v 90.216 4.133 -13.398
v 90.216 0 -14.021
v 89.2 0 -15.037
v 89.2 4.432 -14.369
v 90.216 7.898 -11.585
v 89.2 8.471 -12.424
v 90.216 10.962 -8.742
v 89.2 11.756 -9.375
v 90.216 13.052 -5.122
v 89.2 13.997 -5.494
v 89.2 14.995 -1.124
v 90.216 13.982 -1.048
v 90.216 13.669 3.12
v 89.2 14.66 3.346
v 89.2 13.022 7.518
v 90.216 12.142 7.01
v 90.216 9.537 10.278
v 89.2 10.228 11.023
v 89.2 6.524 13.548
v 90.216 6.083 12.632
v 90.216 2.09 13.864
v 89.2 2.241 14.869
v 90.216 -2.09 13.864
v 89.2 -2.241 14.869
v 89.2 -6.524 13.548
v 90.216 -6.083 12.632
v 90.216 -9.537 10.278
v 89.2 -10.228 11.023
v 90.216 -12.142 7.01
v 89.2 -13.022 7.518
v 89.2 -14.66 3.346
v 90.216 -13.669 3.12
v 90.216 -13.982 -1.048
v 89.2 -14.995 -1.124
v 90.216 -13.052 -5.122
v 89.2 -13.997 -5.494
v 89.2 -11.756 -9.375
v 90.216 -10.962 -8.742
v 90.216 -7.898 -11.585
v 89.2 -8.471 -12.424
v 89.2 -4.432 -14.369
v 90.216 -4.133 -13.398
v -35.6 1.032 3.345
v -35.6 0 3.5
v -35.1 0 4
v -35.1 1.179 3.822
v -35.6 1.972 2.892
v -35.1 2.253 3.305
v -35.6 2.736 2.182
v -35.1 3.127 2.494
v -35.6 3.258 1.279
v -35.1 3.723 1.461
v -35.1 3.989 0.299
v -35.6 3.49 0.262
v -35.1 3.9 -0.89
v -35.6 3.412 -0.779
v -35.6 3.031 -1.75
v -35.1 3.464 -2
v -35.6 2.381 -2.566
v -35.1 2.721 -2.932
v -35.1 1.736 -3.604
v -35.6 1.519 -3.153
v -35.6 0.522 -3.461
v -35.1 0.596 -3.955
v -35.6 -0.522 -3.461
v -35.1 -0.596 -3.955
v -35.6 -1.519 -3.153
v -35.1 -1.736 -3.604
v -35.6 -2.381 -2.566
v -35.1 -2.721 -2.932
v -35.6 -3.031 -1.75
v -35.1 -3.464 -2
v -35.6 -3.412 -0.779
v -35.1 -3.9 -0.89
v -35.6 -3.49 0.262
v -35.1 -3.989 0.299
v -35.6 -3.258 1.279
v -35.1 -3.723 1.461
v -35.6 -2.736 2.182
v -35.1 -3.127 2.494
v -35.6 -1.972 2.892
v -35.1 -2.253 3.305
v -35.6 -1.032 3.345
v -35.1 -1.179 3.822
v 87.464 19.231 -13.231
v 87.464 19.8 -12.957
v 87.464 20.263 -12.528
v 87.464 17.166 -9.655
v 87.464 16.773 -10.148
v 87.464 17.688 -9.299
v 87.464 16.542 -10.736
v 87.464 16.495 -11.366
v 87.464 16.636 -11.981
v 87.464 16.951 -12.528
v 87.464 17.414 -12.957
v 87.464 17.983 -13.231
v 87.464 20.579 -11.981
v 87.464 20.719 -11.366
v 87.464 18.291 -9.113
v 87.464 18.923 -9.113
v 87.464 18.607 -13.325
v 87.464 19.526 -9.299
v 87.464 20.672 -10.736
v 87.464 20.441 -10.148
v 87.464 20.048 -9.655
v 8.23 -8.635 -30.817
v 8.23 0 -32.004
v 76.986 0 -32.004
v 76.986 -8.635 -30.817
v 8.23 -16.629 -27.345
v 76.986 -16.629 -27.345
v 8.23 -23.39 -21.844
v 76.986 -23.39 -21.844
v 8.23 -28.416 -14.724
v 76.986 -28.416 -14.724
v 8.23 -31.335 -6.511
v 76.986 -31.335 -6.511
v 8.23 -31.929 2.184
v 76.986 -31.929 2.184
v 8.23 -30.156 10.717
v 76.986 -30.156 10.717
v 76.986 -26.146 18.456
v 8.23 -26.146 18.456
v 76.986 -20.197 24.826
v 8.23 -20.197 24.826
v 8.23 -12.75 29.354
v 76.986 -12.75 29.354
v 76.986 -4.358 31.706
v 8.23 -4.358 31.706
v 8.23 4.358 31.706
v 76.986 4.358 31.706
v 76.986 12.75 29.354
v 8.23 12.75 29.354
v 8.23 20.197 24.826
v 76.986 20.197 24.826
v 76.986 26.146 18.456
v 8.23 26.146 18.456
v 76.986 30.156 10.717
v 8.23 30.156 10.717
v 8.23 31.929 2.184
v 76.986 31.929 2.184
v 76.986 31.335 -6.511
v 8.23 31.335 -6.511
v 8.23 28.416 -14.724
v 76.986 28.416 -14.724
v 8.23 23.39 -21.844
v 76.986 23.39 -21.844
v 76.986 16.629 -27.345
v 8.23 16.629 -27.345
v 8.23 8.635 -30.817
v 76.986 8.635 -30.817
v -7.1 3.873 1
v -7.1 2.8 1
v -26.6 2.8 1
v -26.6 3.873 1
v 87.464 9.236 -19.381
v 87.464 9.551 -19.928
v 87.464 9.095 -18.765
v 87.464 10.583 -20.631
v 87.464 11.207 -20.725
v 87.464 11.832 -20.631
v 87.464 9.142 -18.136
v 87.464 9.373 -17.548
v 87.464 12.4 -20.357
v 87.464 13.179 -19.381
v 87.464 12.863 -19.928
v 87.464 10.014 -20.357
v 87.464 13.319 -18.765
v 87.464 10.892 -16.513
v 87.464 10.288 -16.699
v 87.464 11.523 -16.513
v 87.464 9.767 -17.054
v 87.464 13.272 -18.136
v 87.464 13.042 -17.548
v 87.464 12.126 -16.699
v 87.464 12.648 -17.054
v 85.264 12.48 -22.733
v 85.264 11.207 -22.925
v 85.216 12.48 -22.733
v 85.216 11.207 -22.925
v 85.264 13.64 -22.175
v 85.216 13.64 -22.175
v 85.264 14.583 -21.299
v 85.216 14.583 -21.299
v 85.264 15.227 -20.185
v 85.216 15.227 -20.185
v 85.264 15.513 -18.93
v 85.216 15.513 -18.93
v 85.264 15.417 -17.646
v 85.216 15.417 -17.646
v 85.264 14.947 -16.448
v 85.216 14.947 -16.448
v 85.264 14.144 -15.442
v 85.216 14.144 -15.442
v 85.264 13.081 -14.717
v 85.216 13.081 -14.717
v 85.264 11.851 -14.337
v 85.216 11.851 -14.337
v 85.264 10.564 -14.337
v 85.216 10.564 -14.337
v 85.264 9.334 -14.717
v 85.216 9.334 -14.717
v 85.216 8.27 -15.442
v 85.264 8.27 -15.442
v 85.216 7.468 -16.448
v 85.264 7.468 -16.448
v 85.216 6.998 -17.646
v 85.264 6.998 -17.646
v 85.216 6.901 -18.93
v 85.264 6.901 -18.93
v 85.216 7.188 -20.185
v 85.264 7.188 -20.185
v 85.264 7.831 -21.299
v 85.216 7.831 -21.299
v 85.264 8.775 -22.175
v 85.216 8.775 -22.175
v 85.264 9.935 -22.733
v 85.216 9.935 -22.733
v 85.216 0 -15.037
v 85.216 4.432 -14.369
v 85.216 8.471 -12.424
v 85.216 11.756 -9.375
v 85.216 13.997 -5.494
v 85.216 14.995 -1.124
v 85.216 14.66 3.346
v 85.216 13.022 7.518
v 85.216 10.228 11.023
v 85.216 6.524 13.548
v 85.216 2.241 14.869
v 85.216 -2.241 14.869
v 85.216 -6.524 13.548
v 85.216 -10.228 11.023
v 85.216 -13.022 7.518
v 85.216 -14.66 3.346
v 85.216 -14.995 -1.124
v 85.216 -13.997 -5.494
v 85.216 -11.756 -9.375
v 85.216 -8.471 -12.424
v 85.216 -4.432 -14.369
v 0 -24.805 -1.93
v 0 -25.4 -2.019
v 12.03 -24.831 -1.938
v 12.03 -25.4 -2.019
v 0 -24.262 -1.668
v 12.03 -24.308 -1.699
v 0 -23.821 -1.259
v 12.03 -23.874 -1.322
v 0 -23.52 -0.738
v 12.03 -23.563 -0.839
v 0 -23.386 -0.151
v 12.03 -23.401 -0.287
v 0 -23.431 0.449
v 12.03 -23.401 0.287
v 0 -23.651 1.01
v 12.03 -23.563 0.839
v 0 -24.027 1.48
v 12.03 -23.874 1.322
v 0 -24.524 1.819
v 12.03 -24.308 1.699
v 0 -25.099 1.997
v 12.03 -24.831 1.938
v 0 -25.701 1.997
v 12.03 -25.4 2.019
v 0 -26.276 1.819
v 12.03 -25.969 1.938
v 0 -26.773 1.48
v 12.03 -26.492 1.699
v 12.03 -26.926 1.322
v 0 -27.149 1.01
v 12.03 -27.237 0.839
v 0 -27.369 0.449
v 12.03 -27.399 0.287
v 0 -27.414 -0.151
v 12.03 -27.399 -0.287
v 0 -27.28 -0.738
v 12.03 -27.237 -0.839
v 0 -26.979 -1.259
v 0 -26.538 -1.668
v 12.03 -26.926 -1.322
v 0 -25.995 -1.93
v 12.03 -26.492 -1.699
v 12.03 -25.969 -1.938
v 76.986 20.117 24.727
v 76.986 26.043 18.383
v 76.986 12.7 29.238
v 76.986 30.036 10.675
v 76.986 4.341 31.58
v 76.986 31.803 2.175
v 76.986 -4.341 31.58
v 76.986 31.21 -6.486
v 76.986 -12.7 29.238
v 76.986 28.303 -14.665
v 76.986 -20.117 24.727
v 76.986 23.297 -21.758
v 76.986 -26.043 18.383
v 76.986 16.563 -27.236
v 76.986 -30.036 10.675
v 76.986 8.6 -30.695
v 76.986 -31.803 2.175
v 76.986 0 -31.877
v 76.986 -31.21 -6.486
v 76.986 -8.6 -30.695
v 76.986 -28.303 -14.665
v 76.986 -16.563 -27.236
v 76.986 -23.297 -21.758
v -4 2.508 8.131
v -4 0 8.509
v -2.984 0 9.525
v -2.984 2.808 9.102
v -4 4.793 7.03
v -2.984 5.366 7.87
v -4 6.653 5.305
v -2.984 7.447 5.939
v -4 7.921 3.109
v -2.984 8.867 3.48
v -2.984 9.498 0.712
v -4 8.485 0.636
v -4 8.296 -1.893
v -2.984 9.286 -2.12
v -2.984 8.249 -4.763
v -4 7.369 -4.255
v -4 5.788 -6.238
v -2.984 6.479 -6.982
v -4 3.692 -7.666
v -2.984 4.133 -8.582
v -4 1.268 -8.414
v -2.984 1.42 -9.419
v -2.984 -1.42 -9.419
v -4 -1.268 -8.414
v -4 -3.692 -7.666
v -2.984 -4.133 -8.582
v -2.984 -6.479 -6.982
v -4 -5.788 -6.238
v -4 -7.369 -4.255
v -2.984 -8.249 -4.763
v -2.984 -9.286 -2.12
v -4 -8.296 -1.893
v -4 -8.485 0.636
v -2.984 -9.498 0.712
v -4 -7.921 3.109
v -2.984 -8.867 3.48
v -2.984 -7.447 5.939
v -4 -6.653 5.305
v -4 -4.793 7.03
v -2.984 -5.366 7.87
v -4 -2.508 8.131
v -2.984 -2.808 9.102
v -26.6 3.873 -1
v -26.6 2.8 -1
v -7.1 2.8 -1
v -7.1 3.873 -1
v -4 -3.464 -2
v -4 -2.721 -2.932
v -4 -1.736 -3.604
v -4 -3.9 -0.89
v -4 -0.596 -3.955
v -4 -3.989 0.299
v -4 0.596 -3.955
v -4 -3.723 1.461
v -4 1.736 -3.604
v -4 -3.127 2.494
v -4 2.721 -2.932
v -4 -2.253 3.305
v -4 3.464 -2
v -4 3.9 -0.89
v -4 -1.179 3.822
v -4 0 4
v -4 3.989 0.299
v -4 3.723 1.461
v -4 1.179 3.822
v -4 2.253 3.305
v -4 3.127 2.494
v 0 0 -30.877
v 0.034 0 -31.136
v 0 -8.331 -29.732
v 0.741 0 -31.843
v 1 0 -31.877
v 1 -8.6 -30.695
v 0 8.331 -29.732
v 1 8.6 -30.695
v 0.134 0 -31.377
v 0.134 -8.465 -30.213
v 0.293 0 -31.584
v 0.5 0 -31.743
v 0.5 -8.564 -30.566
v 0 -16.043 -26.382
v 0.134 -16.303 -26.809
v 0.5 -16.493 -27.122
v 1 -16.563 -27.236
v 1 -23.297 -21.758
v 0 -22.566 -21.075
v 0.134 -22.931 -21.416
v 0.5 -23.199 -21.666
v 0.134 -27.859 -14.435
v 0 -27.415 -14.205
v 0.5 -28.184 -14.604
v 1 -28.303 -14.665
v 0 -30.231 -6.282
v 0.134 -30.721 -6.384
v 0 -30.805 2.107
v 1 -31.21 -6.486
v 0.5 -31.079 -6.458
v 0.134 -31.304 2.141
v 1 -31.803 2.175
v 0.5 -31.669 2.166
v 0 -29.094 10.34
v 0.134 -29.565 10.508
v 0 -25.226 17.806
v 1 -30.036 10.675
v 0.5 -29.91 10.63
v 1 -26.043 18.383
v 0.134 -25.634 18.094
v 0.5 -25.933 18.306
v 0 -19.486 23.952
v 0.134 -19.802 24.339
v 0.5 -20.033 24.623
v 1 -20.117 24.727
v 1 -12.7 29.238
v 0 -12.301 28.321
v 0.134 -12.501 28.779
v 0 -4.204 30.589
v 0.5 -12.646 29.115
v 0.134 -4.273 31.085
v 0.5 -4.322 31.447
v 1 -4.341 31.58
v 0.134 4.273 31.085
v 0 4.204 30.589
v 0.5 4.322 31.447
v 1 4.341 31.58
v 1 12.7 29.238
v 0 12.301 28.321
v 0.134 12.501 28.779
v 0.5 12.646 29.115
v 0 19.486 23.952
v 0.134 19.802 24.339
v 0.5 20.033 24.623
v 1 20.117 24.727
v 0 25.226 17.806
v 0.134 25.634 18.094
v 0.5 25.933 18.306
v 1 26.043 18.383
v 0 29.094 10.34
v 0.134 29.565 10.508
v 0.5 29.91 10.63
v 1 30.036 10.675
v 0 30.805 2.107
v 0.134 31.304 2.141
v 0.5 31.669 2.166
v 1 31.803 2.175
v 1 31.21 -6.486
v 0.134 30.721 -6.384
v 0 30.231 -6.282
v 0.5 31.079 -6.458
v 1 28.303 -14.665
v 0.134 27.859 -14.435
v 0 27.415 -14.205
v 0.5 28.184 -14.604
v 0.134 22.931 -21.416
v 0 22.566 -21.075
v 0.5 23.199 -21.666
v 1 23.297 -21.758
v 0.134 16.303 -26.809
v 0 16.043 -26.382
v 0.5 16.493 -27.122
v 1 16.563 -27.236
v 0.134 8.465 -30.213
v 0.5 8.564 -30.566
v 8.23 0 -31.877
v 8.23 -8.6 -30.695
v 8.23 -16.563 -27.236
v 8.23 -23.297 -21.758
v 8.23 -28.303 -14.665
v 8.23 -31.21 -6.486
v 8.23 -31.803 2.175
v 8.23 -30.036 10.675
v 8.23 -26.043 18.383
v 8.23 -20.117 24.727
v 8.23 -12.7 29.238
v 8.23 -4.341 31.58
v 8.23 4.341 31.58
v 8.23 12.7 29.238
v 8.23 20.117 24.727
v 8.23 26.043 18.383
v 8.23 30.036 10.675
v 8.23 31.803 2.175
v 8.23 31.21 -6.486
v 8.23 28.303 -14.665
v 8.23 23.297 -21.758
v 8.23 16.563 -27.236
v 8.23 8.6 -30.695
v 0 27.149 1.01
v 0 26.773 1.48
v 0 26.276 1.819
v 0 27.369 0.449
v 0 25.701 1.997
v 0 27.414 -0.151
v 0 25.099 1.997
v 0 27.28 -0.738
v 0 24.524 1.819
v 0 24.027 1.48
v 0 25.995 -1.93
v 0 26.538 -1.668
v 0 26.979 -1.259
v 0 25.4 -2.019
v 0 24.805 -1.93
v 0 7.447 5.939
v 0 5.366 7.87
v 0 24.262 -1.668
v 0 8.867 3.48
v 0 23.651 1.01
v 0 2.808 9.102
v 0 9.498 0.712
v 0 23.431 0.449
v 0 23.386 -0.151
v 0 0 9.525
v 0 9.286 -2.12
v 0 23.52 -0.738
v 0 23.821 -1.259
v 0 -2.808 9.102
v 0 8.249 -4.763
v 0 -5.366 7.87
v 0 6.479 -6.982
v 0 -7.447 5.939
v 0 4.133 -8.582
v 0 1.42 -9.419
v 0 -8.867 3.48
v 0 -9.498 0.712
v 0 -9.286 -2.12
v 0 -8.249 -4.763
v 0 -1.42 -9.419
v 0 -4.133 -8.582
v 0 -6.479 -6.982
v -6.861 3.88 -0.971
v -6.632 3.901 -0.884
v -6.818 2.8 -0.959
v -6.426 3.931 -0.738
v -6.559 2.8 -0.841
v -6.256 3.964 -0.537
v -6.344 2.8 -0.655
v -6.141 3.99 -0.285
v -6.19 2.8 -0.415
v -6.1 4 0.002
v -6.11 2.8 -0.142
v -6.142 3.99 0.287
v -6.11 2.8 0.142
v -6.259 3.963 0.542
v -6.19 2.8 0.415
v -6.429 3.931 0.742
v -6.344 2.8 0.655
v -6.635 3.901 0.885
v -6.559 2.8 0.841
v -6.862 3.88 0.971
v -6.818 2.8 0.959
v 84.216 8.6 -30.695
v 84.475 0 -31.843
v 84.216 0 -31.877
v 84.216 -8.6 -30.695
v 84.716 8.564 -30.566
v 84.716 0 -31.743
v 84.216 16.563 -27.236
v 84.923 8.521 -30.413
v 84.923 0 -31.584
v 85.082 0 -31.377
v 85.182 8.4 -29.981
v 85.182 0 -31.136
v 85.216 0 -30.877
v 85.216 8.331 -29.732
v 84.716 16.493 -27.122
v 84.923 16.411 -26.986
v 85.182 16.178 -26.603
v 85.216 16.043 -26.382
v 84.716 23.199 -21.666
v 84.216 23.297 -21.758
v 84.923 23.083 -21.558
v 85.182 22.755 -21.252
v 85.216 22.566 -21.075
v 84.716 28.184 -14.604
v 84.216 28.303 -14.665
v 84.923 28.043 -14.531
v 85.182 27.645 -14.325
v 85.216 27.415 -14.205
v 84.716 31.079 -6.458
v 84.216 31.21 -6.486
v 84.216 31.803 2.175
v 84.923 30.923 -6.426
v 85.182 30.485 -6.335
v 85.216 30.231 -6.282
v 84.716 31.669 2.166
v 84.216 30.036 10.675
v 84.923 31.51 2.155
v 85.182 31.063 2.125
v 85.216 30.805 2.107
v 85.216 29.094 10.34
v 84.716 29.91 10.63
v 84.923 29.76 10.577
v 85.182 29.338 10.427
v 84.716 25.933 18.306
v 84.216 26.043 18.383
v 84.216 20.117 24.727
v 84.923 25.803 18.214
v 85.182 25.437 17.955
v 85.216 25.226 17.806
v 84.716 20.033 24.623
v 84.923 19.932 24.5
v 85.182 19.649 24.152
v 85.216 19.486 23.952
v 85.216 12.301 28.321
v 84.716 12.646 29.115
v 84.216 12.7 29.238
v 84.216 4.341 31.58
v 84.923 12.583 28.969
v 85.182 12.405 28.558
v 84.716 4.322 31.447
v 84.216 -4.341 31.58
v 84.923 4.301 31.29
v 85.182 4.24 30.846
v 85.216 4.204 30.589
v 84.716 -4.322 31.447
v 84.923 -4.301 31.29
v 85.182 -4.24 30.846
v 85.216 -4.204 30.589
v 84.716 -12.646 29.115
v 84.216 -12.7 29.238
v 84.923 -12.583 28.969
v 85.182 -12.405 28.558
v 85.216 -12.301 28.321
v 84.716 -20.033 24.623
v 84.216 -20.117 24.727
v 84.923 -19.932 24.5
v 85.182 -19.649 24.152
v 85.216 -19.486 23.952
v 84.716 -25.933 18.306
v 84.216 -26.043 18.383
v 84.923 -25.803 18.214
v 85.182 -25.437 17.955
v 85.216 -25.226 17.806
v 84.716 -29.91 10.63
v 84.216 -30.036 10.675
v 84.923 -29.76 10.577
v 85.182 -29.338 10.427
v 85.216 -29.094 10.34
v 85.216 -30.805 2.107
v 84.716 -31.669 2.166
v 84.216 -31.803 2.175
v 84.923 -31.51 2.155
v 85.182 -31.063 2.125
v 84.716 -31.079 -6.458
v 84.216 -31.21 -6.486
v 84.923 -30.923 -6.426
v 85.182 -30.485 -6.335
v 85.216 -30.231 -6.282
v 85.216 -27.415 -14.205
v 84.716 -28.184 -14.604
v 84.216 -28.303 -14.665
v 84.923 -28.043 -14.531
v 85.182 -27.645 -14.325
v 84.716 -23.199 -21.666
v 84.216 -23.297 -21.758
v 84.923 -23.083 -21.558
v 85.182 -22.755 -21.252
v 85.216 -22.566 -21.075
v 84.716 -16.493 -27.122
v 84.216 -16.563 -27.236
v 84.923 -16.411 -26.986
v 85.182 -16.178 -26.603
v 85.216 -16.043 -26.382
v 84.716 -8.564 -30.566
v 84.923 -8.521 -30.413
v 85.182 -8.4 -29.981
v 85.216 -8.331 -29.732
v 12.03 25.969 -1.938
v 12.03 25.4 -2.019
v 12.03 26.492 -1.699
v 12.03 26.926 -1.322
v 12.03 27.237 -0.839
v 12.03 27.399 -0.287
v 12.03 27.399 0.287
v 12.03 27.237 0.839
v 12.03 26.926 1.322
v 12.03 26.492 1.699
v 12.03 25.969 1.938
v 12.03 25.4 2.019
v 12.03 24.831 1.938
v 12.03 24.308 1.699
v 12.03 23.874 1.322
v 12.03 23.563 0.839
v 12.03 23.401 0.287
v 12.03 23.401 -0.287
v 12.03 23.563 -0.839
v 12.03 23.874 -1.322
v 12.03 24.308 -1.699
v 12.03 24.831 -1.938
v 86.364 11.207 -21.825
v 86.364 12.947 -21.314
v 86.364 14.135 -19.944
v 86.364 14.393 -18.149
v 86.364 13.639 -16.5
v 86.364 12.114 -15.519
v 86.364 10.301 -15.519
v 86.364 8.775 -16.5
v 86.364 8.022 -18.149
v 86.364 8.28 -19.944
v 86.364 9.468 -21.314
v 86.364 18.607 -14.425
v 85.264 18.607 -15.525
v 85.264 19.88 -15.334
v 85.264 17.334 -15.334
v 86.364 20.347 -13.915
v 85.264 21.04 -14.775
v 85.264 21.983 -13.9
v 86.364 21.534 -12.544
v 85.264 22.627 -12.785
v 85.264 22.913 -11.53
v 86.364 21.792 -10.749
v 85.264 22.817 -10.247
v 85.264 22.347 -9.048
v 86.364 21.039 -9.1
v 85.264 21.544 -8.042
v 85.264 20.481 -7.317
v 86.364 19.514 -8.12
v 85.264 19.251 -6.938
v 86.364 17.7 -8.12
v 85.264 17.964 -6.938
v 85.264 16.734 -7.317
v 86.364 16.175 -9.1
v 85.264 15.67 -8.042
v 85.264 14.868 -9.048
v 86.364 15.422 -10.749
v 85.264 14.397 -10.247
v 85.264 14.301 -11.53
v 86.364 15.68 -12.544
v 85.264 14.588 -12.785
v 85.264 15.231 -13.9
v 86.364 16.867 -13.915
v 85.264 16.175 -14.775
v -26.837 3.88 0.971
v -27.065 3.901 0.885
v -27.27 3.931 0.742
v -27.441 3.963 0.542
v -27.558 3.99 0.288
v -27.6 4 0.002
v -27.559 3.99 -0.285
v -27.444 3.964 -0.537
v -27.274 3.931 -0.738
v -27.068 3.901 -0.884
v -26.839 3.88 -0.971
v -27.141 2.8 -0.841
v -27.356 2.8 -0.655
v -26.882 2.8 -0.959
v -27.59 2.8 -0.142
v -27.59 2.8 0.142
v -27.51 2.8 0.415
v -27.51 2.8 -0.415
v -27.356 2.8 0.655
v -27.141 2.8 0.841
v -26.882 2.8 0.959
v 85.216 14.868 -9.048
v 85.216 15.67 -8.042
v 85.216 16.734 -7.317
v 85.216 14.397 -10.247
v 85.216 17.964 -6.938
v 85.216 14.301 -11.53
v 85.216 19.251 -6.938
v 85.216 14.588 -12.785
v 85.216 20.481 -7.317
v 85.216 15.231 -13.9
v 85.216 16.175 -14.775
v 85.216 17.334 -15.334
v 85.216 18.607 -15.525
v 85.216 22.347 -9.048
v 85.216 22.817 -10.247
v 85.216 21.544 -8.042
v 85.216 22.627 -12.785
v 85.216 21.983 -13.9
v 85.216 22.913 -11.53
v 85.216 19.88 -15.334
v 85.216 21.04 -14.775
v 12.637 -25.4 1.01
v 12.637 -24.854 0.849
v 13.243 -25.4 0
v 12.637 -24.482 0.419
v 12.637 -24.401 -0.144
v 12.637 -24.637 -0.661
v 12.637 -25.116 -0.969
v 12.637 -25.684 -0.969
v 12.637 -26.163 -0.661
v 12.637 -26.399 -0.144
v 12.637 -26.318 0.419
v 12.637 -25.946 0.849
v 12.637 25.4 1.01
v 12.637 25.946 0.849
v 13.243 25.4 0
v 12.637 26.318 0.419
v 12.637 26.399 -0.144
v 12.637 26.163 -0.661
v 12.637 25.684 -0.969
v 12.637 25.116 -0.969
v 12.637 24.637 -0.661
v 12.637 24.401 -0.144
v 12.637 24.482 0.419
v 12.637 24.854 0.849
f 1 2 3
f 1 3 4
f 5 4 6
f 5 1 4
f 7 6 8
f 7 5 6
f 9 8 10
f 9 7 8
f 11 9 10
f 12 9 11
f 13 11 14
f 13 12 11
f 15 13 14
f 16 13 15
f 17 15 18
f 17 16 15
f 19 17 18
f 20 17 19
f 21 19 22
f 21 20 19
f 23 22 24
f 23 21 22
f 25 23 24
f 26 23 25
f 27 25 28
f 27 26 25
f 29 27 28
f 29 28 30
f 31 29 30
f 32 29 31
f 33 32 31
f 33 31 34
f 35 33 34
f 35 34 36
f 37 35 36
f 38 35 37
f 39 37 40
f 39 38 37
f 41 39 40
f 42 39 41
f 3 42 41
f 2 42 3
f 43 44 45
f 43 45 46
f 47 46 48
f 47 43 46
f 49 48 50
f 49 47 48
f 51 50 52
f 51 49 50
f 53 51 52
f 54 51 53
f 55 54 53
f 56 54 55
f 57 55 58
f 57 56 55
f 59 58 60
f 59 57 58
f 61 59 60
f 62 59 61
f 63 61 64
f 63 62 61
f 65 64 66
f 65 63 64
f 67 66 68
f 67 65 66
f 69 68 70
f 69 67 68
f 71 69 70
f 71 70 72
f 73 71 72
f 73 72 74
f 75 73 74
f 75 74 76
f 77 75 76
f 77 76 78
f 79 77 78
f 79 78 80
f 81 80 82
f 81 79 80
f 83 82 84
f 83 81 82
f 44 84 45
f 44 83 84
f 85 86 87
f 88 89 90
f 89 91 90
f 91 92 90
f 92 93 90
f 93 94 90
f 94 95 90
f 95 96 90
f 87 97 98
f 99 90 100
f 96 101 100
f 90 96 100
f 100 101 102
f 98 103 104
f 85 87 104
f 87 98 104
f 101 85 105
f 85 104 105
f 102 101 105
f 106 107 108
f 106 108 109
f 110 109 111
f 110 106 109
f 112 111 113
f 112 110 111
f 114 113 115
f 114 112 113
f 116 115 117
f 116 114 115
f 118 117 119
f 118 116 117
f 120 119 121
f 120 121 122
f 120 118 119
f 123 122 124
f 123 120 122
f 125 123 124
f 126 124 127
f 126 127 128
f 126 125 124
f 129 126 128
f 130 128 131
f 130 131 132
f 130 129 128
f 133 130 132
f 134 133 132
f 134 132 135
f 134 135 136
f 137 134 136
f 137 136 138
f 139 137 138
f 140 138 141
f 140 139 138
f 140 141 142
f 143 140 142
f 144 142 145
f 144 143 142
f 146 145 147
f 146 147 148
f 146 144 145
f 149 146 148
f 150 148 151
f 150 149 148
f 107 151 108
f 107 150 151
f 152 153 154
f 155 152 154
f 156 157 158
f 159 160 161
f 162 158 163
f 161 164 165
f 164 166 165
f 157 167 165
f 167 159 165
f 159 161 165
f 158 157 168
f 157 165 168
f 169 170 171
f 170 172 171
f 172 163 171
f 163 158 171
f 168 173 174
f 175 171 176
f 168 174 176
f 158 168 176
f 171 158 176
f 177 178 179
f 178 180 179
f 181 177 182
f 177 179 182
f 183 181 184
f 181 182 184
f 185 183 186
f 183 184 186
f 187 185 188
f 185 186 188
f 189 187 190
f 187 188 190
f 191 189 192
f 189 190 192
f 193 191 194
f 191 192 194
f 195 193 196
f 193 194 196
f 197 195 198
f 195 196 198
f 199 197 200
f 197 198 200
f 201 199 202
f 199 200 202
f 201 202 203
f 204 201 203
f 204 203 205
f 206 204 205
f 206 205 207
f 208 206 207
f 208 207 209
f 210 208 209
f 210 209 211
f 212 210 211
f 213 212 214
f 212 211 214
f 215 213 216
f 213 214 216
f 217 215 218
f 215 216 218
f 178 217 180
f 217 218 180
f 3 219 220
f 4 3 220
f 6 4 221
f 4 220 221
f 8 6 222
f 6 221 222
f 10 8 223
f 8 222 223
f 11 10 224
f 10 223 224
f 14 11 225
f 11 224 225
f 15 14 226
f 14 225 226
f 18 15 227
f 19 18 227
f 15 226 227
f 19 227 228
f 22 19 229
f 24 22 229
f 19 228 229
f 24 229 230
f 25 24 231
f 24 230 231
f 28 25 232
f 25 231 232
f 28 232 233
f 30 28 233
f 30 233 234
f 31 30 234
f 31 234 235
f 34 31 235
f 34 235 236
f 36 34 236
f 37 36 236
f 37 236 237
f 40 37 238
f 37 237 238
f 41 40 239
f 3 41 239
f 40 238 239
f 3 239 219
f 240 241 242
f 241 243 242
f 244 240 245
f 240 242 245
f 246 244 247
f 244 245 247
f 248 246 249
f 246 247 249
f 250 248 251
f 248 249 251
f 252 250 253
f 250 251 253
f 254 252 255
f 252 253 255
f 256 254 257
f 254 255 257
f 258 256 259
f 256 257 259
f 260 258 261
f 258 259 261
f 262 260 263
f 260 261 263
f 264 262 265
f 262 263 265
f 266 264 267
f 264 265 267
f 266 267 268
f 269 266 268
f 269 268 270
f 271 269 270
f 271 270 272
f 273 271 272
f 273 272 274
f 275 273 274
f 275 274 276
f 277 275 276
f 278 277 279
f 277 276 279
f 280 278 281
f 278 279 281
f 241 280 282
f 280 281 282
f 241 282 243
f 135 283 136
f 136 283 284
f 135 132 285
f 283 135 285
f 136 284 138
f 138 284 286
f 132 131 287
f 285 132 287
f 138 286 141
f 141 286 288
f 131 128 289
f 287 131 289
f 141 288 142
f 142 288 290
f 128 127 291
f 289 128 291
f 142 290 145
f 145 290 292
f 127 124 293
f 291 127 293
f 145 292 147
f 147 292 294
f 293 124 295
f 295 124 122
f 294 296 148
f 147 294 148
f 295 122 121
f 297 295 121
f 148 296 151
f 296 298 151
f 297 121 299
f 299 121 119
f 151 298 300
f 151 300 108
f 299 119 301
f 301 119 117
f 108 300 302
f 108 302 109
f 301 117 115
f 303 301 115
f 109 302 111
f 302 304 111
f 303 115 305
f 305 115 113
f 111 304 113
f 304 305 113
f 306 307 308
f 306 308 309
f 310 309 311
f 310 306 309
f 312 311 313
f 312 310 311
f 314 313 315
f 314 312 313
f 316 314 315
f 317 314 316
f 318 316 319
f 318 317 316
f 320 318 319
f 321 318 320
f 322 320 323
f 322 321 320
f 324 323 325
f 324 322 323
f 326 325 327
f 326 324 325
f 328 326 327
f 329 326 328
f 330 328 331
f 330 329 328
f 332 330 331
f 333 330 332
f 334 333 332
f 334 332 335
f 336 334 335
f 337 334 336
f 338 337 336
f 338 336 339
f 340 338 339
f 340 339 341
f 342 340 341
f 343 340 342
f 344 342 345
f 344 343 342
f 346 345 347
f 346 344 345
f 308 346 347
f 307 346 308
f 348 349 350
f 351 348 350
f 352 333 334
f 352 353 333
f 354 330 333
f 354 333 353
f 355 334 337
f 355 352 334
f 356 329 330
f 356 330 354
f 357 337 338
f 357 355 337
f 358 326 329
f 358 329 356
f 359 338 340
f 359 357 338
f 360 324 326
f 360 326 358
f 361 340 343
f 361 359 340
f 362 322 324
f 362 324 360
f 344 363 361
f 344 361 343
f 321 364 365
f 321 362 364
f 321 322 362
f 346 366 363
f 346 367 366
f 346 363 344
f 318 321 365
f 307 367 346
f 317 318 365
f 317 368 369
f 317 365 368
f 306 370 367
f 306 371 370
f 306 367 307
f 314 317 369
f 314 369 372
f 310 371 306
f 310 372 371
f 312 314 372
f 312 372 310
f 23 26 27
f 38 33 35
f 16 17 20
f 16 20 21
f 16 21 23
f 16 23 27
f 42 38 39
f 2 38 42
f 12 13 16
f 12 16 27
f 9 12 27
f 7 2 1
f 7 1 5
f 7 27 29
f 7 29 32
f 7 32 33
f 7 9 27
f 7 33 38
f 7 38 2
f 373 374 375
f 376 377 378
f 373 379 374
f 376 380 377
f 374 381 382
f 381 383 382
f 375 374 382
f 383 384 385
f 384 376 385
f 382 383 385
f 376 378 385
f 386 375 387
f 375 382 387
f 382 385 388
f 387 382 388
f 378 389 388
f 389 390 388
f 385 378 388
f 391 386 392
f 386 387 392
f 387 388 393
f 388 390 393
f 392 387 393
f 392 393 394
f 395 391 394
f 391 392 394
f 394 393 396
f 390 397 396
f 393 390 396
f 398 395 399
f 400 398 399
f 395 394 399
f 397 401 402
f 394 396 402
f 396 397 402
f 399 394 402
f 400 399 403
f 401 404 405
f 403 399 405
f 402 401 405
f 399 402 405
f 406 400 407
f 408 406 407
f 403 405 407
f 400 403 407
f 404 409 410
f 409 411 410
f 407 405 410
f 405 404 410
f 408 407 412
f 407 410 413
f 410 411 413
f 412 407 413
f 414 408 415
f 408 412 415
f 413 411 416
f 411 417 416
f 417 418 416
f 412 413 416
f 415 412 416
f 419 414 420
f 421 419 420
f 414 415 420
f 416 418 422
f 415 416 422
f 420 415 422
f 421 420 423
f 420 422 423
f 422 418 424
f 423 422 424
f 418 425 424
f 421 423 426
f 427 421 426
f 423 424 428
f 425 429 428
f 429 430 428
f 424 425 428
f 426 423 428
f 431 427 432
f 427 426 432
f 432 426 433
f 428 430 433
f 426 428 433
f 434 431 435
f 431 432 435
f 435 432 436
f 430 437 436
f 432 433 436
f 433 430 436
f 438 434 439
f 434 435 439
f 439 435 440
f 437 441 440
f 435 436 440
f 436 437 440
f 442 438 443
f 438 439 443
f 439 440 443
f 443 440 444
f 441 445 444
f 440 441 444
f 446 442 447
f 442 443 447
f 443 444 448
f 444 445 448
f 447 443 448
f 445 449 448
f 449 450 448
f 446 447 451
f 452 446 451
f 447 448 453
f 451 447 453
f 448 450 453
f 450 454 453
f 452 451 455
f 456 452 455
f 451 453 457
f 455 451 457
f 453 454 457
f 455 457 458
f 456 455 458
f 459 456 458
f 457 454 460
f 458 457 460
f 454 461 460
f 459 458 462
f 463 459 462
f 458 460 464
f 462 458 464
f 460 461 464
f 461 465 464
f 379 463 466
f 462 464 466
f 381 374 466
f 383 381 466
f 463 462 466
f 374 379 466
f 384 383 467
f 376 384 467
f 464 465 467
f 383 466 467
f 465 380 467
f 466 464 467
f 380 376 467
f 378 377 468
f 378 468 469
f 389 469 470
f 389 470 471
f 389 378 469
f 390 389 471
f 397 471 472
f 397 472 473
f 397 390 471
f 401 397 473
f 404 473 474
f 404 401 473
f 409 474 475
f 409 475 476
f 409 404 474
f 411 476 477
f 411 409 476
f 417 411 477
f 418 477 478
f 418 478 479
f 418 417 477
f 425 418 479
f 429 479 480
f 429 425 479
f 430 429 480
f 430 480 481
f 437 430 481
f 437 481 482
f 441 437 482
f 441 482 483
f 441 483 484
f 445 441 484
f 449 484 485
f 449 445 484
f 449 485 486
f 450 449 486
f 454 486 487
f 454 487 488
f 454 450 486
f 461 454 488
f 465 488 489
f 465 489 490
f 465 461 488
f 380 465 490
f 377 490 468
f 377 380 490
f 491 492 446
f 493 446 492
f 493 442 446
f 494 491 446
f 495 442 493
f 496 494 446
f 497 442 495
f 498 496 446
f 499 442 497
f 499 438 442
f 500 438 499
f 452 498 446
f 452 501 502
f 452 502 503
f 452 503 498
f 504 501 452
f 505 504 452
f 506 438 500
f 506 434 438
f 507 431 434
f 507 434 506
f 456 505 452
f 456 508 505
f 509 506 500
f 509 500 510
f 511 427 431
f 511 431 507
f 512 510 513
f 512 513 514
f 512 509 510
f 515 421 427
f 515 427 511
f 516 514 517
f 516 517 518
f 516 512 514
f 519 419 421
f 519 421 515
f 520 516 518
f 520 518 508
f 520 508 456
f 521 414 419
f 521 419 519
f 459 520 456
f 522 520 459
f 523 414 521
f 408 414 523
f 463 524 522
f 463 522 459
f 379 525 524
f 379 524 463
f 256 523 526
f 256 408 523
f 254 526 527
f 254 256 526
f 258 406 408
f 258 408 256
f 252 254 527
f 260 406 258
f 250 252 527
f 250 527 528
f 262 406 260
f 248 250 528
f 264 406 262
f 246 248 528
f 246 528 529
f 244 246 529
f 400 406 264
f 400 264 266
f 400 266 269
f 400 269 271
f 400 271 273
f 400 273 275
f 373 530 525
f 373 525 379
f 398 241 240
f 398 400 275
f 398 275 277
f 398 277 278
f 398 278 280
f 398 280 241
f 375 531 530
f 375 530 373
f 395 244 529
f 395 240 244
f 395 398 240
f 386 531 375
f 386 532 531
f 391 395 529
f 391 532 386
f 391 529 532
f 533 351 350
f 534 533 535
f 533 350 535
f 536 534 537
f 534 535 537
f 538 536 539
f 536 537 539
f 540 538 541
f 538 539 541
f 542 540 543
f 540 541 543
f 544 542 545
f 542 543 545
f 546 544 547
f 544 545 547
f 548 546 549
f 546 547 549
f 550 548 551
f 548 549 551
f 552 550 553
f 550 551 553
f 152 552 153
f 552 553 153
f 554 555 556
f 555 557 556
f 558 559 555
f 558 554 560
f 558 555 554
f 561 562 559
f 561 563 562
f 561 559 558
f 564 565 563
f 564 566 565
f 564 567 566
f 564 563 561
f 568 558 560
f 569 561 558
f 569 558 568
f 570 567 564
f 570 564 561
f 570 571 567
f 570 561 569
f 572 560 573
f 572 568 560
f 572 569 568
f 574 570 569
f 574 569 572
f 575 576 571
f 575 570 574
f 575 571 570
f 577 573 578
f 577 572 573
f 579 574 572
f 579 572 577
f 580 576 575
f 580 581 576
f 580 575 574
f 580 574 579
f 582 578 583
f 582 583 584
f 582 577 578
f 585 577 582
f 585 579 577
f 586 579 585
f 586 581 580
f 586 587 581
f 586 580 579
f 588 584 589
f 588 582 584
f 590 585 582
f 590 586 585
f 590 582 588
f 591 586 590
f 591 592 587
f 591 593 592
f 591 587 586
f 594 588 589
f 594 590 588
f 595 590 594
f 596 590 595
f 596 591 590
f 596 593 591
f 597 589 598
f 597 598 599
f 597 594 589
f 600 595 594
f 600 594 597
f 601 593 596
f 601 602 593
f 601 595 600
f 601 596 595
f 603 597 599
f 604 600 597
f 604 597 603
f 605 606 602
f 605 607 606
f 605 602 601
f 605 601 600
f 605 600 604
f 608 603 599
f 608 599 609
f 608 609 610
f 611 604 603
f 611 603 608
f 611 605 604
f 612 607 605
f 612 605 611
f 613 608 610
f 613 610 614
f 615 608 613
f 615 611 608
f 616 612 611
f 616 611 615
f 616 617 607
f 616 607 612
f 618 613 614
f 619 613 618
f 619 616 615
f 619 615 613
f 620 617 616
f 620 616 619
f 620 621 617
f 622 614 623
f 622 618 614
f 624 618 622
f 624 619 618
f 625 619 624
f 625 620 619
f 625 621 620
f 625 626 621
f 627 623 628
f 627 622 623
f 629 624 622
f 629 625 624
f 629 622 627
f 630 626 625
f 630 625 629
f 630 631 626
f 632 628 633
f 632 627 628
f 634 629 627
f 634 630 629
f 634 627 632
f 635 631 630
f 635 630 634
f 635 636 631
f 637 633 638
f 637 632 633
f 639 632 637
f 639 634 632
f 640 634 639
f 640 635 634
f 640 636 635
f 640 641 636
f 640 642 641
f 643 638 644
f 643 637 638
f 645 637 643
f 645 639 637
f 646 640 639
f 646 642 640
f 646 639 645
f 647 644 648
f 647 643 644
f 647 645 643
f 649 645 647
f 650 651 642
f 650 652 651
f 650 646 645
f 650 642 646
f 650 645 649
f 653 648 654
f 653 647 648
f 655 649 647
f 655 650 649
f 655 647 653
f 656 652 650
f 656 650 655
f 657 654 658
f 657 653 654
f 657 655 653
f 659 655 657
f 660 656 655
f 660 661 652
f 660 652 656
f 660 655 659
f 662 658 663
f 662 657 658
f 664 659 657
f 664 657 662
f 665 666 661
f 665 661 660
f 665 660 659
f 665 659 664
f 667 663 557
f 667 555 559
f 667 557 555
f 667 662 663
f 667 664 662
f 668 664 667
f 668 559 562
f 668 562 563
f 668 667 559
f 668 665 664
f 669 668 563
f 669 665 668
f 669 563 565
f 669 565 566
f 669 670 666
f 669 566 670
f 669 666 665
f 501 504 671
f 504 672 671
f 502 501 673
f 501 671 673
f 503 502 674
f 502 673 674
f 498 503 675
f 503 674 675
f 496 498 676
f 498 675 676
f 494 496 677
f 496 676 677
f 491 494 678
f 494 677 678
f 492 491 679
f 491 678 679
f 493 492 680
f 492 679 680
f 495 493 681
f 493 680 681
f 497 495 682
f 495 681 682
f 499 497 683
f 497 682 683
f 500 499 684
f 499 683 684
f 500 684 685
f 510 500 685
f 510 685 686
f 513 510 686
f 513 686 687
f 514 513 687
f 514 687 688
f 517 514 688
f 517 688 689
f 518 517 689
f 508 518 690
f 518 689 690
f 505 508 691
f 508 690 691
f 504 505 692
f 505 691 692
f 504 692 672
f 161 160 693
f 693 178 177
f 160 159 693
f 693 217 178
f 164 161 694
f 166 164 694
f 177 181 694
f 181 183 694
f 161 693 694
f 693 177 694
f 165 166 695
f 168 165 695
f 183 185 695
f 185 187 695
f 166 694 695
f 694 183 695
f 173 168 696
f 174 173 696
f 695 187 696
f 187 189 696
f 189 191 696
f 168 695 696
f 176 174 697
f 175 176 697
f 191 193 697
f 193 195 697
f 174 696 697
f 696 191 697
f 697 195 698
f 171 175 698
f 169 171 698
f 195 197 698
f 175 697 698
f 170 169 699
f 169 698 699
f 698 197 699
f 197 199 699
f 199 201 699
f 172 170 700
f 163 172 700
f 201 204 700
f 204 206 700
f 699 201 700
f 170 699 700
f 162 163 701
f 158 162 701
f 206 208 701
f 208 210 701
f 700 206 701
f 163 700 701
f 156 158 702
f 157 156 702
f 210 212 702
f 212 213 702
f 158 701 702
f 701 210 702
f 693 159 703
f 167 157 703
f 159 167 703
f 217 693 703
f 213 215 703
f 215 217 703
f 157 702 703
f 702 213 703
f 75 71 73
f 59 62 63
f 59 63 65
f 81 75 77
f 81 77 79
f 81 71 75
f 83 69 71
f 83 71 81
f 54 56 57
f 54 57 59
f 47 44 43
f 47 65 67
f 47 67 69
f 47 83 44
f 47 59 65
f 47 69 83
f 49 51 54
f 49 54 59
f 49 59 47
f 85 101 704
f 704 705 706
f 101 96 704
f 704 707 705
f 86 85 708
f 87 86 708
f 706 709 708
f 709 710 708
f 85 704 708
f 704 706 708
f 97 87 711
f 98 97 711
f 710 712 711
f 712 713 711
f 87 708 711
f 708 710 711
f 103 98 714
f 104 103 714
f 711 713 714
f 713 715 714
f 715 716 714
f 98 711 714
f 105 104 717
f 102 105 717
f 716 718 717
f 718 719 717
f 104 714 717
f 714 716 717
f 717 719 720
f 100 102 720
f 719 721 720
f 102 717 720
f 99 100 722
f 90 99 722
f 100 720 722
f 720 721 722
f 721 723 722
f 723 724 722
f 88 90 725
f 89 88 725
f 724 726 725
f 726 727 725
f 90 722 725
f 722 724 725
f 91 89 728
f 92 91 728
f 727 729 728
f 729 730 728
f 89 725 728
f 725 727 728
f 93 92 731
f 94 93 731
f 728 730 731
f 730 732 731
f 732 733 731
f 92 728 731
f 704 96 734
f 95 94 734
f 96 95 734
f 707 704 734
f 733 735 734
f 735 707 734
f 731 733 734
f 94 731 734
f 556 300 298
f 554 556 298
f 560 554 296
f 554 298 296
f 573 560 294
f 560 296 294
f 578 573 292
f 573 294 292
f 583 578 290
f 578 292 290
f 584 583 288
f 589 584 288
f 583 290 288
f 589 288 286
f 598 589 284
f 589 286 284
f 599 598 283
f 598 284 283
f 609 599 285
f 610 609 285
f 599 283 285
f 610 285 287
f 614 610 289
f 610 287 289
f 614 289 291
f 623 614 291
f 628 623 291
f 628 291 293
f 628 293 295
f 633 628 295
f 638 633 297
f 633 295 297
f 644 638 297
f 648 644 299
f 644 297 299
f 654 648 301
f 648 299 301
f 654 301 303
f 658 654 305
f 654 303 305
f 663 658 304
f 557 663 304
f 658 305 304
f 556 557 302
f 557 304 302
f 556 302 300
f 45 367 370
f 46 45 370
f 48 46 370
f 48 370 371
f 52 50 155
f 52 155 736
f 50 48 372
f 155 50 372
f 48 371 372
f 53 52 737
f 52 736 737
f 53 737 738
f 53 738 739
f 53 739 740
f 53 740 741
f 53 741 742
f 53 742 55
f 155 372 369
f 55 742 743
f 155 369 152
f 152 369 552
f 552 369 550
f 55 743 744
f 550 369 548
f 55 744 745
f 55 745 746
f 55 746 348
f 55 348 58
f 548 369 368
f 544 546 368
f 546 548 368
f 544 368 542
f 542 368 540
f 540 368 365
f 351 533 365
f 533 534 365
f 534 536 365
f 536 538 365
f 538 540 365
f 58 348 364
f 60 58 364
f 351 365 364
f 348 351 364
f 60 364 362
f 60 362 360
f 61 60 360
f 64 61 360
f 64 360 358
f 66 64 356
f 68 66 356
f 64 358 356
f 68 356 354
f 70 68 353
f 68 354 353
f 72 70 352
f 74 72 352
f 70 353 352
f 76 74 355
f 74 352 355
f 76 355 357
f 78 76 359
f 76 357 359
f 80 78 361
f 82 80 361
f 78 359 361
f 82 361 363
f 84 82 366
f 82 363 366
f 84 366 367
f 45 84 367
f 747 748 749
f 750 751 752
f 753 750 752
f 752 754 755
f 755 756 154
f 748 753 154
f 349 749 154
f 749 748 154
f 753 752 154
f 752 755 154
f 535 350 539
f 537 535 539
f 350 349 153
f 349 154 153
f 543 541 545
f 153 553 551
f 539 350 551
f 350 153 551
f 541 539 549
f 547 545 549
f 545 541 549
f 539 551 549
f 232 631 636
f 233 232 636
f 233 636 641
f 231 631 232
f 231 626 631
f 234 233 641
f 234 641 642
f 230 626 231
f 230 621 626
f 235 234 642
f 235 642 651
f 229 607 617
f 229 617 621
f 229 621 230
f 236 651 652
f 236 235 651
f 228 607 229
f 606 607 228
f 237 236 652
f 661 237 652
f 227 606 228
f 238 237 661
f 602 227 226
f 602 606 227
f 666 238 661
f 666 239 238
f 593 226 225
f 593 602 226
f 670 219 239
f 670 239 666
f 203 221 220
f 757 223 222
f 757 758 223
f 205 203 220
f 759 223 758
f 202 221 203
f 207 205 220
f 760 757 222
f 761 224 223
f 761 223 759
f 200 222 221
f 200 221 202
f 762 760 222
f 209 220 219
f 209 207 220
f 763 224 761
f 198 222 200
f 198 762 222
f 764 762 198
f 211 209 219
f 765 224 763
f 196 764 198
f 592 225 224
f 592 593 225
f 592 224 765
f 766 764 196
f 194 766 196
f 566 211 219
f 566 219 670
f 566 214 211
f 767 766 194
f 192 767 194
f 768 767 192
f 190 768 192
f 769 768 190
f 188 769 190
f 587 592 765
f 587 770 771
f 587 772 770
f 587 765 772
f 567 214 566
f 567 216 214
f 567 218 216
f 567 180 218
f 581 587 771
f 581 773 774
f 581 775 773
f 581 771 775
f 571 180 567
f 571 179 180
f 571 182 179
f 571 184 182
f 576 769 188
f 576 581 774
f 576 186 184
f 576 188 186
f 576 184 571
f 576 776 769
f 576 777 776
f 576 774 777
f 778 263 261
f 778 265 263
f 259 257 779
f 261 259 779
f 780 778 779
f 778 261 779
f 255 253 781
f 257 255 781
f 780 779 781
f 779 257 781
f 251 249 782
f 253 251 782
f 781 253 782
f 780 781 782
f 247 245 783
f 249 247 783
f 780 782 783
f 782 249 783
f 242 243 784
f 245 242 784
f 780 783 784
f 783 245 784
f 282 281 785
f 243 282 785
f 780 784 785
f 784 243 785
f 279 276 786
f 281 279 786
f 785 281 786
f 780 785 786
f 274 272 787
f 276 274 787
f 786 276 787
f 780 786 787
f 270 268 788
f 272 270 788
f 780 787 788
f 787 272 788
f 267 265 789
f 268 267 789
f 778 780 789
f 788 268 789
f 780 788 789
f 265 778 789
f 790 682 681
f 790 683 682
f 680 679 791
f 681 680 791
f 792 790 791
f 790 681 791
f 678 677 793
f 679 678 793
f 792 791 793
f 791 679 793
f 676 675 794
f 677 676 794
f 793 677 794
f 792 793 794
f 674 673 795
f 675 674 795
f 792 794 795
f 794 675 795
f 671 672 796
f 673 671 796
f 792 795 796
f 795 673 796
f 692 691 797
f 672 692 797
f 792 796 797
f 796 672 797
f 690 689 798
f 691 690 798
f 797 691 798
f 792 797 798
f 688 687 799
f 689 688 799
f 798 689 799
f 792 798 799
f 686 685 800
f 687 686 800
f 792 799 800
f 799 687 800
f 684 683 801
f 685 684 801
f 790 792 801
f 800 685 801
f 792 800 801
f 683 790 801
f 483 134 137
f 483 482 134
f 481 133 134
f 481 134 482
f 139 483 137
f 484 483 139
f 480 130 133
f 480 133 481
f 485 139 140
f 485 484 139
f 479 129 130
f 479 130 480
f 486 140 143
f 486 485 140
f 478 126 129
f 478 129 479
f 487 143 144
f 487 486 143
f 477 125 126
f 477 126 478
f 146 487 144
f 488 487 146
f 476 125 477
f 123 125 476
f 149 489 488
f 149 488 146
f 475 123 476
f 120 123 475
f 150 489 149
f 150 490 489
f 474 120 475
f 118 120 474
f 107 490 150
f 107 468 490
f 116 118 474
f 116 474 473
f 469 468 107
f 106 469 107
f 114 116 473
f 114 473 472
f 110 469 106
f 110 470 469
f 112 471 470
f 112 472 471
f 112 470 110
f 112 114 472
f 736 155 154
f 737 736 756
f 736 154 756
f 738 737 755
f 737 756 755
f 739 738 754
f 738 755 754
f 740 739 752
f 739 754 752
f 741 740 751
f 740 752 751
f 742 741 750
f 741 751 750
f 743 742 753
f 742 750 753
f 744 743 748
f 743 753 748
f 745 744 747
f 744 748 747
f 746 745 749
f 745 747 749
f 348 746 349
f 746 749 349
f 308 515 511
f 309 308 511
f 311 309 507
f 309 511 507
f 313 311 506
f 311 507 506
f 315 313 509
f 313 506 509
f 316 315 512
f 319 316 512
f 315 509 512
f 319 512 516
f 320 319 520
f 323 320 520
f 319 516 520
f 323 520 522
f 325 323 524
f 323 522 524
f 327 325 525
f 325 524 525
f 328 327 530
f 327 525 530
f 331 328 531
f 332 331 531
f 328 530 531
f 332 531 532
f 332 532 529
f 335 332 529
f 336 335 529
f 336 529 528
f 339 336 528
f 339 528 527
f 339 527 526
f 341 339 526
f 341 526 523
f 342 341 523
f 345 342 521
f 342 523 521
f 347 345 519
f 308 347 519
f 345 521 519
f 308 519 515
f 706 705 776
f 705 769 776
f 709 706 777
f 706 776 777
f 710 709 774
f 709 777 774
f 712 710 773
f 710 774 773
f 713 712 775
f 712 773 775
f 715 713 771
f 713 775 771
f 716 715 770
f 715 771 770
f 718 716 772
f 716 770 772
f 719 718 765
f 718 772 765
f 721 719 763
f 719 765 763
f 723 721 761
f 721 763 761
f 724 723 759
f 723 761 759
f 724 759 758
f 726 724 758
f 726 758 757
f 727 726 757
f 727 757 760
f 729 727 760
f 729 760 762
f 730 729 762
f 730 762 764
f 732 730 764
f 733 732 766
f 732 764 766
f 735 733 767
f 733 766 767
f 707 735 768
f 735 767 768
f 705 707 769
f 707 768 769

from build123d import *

# Parameters (mm, degrees)
SKETCH1_R                  = 32.004
BOSS_EXTRUDE1_DEPTH        = 68.7568
SKETCH2_R                  = 31.877
BOSS_EXTRUDE2_DEPTH        = 8.2296
SKETCH3_R                  = 15.0368
BOSS_EXTRUDE3_DEPTH        = 5
BOSS_EXTRUDE4_START        = 8.2296
SKETCH4_R                  = 31.877
BOSS_EXTRUDE4_DEPTH        = 8.2296
SKETCH5_R                  = 9.525
BOSS_EXTRUDE5_DEPTH        = 4
SKETCH6_R                  = 4
BOSS_EXTRUDE6_DEPTH        = 31.6
CUT_EXTRUDE1_REACH         = 103.855
CUT_EXTRUDE1_END_RADIUS    = 4
F_10_32_TAPPED_HOLE1_D     = 4.0386
F_10_32_TAPPED_HOLE1_DEPTH = 12.03
F_10_32_TAPPED_HOLE1_TIP   = 1.213317848
CHAMFER1_SIZE              = 1.016
CHAMFER2_SIZE              = 0.5
FILLET1_R                  = 1


with BuildPart() as part:
    # Sketch1 → Boss-Extrude1 (new body)
    with BuildSketch(Plane(origin=(8.2296, 0, 0), x_dir=(0, -1, 0), z_dir=(-1, 0, 0))):
        with Locations(Location((0, 0, 0), (0, 0, 270))):
            Circle(SKETCH1_R)
    extrude(amount=-BOSS_EXTRUDE1_DEPTH)

    # Sketch2 → Boss-Extrude2 (add)
    with BuildSketch(Plane(origin=(76.9864, 0, 0), x_dir=(0, 0, -1), z_dir=(1, 0, 0))):
        Circle(SKETCH2_R)
    extrude(amount=BOSS_EXTRUDE2_DEPTH)

    # Sketch3 → Boss-Extrude3 (add)
    with BuildSketch(Plane(origin=(85.216, 0, 0), x_dir=(0, 0, -1), z_dir=(1, 0, 0))):
        Circle(SKETCH3_R)
    extrude(amount=BOSS_EXTRUDE3_DEPTH)

    # Sketch4 → Boss-Extrude4 (add)
    with BuildSketch(Plane.ZY.offset(-8.2296).offset(BOSS_EXTRUDE4_START)):
        with Locations(Location((0, 0, 0), (0, 0, 180))):
            Circle(SKETCH4_R)
    extrude(amount=-BOSS_EXTRUDE4_DEPTH)

    # Sketch5 → Boss-Extrude5 (add)
    with BuildSketch(Plane.ZY):
        Circle(SKETCH5_R)
    extrude(amount=BOSS_EXTRUDE5_DEPTH)

    # Sketch6 → Boss-Extrude6 (add)
    with BuildSketch(Plane.ZY.offset(4)):
        Circle(SKETCH6_R)
    extrude(amount=BOSS_EXTRUDE6_DEPTH)

    # Cut-Extrude1: up to this cylinder (the profile starts inside it)
    cut_extrude1_end = Plane(origin=(-16.85, 0, 0), z_dir=(1, 0, 0)) * Cylinder(CUT_EXTRUDE1_END_RADIUS, 216.71, mode=Mode.PRIVATE)
    # Sketch7 → Cut-Extrude1 (cut, up to the surface)
    with BuildSketch(Plane.XZ.offset(-2.8), mode=Mode.PRIVATE) as cut_extrude1_sk1:
        with BuildLine():
            Line((-7.1, 1), (-26.6, 1))
            ThreePointArc((-26.6, 1), (-27.6, 0), (-26.6, -1))
            Line((-26.6, -1), (-7.1, -1))
            ThreePointArc((-7.1, -1), (-6.1, 0), (-7.1, 1))
        make_face()
    cut_extrude1_tool1 = extrude(cut_extrude1_sk1.sketch, amount=-CUT_EXTRUDE1_REACH, mode=Mode.PRIVATE) & cut_extrude1_end
    add(cut_extrude1_tool1.solids().sort_by_distance((-16.85, 2.8, 0))[0], mode=Mode.SUBTRACT)

    # Sketch8 → Revolve1 (revolve)
    with BuildSketch(Plane.XY.offset(-18.607090683), mode=Mode.PRIVATE) as revolve1_sk:
        Polygon((85.216, 15.525359639), (85.216, 11.207359639), (87.4639, 11.207359639), (87.4639, 13.325359639), (85.2639, 15.525359639), align=None)
    revolve(revolve1_sk.sketch.rotate(Axis((85.216, 11.207359639, -18.607090683), (1, 0, 0)), 270), axis=Axis((85.216, 11.207359639, -18.607090683), (1, 0, 0)))

    # Sketch9 → Revolve2 (revolve)
    with BuildSketch(Plane.XY.offset(-11.207359639), mode=Mode.PRIVATE) as revolve2_sk:
        Polygon((85.216, 22.925090683), (85.216, 18.607090683), (87.4639, 18.607090683), (87.4639, 20.725090683), (85.2639, 22.925090683), align=None)
    revolve(revolve2_sk.sketch.rotate(Axis((85.216, 18.607090683, -11.207359639), (1, 0, 0)), 270), axis=Axis((85.216, 18.607090683, -11.207359639), (1, 0, 0)))

    # #10-32 Tapped Hole1
    with Locations(Plane.ZY):
        with Locations((0, 25.4), (0, -25.4)):
            Hole(F_10_32_TAPPED_HOLE1_D / 2, depth=F_10_32_TAPPED_HOLE1_DEPTH)
            with Locations((0, 0, -(F_10_32_TAPPED_HOLE1_DEPTH + F_10_32_TAPPED_HOLE1_TIP / 2))):  # 118° drill point
                Cone(0, F_10_32_TAPPED_HOLE1_D / 2, F_10_32_TAPPED_HOLE1_TIP, mode=Mode.SUBTRACT)

    # Chamfer1
    chamfer1_edges = [part.edges().sort_by_distance(p)[0] for p in [
        (90.216, 0, 15.0368),
        (-4, 0, -9.525),
    ]]
    chamfer(chamfer1_edges, length=CHAMFER1_SIZE)

    # Chamfer2
    chamfer2_edges = [part.edges().sort_by_distance(p)[0] for p in [
        (-35.6, 0, -4),
    ]]
    chamfer(chamfer2_edges, length=CHAMFER2_SIZE)

    # Fillet1
    fillet1_edges = [part.edges().sort_by_distance(p)[0] for p in [
        (0, 0, 31.877),
        (85.216, 0, 31.877),
    ]]
    fillet(fillet1_edges, radius=FILLET1_R)


solid = part.part
